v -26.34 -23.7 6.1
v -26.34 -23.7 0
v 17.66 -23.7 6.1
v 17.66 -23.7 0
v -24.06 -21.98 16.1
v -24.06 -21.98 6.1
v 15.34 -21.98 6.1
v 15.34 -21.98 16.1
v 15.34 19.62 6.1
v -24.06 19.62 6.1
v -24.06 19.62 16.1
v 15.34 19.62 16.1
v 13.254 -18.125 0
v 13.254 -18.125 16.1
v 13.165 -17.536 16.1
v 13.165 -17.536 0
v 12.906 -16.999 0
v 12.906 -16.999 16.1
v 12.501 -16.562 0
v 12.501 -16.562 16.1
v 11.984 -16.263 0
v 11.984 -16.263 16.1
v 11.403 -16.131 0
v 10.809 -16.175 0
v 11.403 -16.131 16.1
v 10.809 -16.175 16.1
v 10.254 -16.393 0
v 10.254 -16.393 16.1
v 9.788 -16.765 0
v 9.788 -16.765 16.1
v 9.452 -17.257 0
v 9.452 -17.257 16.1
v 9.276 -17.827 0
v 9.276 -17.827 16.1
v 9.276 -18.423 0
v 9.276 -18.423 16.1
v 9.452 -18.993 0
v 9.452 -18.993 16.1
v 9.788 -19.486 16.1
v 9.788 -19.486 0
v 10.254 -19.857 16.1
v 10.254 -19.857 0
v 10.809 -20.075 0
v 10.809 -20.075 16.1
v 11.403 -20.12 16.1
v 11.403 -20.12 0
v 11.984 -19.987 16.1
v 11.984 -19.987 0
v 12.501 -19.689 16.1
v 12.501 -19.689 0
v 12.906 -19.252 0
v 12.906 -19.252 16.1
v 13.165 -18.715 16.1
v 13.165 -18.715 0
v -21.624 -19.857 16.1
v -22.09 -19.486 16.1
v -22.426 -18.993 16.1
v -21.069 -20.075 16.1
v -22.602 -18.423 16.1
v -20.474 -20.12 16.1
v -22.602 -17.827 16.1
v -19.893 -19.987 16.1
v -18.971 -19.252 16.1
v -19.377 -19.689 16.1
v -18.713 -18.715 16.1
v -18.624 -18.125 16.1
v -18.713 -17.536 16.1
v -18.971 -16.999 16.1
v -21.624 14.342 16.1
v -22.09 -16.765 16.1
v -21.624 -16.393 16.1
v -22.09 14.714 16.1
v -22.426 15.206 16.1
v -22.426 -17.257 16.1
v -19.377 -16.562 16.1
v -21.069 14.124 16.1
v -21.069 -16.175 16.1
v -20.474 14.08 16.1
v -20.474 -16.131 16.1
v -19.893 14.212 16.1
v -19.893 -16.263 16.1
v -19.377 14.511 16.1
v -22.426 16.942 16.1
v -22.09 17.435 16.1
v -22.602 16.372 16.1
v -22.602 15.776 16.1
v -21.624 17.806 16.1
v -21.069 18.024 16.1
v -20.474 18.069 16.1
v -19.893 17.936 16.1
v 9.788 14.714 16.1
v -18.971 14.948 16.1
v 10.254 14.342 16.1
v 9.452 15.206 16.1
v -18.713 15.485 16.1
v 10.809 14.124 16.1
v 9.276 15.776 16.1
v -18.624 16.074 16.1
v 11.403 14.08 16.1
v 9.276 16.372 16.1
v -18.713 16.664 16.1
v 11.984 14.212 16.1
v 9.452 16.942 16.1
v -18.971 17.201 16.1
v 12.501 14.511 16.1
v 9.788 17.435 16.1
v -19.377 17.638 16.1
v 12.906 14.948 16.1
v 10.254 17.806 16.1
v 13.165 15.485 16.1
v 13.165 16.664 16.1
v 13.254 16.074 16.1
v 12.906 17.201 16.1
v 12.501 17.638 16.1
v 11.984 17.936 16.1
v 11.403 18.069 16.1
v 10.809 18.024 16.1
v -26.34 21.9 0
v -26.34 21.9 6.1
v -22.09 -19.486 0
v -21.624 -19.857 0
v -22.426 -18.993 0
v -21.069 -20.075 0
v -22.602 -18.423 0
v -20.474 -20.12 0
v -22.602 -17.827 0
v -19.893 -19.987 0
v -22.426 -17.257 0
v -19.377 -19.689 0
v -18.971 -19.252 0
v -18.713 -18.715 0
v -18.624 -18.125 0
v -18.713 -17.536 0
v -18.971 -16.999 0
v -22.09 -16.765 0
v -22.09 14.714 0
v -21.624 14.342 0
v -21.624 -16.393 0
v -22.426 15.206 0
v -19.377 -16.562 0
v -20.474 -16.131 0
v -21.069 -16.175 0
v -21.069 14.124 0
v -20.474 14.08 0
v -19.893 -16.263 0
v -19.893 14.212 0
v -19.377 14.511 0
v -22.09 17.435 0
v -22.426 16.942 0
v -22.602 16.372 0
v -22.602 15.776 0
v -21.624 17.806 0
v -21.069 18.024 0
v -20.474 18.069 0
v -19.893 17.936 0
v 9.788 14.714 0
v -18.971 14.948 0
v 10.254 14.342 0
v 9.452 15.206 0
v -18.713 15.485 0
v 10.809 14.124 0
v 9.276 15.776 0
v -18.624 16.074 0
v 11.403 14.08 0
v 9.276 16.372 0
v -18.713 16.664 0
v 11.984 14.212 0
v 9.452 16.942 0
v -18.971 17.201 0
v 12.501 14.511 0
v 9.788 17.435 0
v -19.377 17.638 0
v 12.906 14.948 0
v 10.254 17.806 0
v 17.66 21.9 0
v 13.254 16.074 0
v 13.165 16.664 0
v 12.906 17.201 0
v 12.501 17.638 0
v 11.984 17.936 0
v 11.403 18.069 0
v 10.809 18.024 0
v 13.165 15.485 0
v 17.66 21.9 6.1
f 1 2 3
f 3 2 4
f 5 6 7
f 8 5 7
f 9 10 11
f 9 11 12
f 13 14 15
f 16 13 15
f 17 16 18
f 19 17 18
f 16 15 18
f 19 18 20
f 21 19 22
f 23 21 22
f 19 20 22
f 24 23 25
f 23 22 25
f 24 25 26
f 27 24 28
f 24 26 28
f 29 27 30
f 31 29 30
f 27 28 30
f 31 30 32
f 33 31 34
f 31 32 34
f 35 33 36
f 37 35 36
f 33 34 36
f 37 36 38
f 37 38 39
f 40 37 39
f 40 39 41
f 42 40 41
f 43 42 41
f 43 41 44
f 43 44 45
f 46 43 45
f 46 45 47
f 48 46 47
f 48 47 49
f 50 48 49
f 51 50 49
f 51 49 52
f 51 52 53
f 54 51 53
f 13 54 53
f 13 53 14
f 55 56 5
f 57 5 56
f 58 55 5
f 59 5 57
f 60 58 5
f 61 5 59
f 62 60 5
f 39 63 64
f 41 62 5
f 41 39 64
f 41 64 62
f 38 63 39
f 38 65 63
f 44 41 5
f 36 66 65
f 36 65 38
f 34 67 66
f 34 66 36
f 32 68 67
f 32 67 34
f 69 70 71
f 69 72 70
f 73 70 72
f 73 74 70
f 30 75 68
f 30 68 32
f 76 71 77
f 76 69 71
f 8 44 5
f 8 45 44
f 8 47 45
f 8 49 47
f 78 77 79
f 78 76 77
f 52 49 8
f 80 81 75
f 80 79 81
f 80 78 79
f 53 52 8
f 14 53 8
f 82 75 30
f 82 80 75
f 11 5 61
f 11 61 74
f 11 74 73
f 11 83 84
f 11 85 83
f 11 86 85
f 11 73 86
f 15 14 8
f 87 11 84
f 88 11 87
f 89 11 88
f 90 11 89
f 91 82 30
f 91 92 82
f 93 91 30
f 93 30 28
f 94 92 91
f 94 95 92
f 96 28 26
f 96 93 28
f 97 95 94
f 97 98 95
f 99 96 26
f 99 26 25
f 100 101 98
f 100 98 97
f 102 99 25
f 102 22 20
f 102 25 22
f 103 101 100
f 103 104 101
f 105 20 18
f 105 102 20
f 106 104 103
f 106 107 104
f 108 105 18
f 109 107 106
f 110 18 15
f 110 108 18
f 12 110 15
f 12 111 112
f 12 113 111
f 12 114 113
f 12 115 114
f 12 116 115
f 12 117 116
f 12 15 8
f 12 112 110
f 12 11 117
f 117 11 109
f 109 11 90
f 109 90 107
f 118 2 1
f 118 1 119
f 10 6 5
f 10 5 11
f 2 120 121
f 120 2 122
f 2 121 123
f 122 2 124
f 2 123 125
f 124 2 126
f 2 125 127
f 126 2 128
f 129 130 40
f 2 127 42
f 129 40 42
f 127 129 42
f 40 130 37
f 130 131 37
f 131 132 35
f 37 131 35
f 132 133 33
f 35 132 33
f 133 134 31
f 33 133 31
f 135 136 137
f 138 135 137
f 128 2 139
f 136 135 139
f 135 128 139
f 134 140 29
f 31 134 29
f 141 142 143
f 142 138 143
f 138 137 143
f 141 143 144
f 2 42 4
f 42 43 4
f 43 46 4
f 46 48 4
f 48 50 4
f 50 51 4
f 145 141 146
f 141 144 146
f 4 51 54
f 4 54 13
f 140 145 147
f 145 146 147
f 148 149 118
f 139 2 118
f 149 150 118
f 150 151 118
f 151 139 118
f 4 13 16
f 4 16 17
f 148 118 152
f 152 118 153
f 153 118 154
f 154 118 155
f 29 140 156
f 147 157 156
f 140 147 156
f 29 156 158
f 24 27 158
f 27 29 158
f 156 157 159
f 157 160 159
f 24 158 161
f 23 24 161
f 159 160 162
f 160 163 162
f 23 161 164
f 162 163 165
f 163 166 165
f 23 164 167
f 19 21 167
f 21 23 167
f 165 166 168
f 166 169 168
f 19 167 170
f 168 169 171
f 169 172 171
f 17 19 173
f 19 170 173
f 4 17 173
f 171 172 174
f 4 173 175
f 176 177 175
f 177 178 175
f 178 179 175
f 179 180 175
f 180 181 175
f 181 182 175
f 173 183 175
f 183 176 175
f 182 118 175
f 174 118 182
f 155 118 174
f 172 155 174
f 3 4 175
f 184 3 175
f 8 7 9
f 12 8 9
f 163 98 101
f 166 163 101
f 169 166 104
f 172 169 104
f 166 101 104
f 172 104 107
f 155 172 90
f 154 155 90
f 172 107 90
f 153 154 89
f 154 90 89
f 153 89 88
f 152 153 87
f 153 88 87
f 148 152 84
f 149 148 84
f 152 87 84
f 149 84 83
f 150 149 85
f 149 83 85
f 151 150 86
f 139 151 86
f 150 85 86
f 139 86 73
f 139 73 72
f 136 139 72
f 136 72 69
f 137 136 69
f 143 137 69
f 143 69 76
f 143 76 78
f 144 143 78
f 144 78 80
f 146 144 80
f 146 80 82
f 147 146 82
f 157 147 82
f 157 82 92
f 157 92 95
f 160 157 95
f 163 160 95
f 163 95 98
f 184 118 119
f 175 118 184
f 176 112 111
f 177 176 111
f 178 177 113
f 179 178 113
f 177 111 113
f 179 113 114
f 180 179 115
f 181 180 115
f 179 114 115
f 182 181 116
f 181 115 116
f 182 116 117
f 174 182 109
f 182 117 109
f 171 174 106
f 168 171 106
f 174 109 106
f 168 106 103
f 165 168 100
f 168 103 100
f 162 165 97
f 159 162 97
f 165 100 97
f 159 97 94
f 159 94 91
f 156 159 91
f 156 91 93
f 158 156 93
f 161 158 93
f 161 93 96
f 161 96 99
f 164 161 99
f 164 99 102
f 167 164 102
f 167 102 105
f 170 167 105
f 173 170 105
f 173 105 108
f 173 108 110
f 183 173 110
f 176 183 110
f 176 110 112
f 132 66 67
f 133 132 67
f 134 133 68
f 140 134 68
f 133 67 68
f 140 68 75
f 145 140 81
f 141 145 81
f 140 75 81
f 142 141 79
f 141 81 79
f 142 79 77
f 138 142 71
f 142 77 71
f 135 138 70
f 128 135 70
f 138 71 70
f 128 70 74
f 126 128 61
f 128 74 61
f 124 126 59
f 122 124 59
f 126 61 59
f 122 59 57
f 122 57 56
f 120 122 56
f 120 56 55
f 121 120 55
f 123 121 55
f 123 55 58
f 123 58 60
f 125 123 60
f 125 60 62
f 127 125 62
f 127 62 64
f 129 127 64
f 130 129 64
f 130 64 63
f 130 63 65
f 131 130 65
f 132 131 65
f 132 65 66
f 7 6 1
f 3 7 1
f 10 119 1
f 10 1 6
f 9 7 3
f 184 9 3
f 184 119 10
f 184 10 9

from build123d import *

# Parameters (mm, degrees)
SKETCH1_W           = 39.4
SKETCH1_H           = 41.6
BOSS_EXTRUDE1_DEPTH = 16.1
SKETCH1_3_W         = 44
SKETCH1_3_H         = 45.6
SKETCH1_3_W_2       = 39.4
SKETCH1_3_H_2       = 41.6
BOSS_EXTRUDE2_DEPTH = 6.1
SKETCH2_R           = 2
CUT_EXTRUDE1_DEPTH  = 17.1


with BuildPart() as part:
    # Sketch1 → Boss-Extrude1 (new body)
    with BuildSketch(Plane.XY):
        with Locations((-4.36, -1.18)):
            Rectangle(SKETCH1_W, SKETCH1_H)
    extrude(amount=BOSS_EXTRUDE1_DEPTH)

    # Sketch1<3> → Boss-Extrude2 (add)
    with BuildSketch(Plane.XY):
        with Locations((-4.34, -0.9)):
            Rectangle(SKETCH1_3_W, SKETCH1_3_H)
        with Locations((-4.36, -1.18)):
            Rectangle(SKETCH1_3_W_2, SKETCH1_3_H_2, mode=Mode.SUBTRACT)
    extrude(amount=BOSS_EXTRUDE2_DEPTH)

    # Sketch2 → Cut-Extrude1 (cut, through all)
    with BuildSketch(Plane.XY.offset(16.1)):
        with Locations((-20.623955183, -18.125224269)):
            Circle(SKETCH2_R)
        with Locations((-20.623955183, 16.074219179)):
            Circle(SKETCH2_R)
        with Locations((11.253691187, 16.074219179)):
            Circle(SKETCH2_R)
        with Locations((11.253691187, -18.125224269)):
            Circle(SKETCH2_R)
    extrude(amount=-CUT_EXTRUDE1_DEPTH, mode=Mode.SUBTRACT)


solid = part.part
